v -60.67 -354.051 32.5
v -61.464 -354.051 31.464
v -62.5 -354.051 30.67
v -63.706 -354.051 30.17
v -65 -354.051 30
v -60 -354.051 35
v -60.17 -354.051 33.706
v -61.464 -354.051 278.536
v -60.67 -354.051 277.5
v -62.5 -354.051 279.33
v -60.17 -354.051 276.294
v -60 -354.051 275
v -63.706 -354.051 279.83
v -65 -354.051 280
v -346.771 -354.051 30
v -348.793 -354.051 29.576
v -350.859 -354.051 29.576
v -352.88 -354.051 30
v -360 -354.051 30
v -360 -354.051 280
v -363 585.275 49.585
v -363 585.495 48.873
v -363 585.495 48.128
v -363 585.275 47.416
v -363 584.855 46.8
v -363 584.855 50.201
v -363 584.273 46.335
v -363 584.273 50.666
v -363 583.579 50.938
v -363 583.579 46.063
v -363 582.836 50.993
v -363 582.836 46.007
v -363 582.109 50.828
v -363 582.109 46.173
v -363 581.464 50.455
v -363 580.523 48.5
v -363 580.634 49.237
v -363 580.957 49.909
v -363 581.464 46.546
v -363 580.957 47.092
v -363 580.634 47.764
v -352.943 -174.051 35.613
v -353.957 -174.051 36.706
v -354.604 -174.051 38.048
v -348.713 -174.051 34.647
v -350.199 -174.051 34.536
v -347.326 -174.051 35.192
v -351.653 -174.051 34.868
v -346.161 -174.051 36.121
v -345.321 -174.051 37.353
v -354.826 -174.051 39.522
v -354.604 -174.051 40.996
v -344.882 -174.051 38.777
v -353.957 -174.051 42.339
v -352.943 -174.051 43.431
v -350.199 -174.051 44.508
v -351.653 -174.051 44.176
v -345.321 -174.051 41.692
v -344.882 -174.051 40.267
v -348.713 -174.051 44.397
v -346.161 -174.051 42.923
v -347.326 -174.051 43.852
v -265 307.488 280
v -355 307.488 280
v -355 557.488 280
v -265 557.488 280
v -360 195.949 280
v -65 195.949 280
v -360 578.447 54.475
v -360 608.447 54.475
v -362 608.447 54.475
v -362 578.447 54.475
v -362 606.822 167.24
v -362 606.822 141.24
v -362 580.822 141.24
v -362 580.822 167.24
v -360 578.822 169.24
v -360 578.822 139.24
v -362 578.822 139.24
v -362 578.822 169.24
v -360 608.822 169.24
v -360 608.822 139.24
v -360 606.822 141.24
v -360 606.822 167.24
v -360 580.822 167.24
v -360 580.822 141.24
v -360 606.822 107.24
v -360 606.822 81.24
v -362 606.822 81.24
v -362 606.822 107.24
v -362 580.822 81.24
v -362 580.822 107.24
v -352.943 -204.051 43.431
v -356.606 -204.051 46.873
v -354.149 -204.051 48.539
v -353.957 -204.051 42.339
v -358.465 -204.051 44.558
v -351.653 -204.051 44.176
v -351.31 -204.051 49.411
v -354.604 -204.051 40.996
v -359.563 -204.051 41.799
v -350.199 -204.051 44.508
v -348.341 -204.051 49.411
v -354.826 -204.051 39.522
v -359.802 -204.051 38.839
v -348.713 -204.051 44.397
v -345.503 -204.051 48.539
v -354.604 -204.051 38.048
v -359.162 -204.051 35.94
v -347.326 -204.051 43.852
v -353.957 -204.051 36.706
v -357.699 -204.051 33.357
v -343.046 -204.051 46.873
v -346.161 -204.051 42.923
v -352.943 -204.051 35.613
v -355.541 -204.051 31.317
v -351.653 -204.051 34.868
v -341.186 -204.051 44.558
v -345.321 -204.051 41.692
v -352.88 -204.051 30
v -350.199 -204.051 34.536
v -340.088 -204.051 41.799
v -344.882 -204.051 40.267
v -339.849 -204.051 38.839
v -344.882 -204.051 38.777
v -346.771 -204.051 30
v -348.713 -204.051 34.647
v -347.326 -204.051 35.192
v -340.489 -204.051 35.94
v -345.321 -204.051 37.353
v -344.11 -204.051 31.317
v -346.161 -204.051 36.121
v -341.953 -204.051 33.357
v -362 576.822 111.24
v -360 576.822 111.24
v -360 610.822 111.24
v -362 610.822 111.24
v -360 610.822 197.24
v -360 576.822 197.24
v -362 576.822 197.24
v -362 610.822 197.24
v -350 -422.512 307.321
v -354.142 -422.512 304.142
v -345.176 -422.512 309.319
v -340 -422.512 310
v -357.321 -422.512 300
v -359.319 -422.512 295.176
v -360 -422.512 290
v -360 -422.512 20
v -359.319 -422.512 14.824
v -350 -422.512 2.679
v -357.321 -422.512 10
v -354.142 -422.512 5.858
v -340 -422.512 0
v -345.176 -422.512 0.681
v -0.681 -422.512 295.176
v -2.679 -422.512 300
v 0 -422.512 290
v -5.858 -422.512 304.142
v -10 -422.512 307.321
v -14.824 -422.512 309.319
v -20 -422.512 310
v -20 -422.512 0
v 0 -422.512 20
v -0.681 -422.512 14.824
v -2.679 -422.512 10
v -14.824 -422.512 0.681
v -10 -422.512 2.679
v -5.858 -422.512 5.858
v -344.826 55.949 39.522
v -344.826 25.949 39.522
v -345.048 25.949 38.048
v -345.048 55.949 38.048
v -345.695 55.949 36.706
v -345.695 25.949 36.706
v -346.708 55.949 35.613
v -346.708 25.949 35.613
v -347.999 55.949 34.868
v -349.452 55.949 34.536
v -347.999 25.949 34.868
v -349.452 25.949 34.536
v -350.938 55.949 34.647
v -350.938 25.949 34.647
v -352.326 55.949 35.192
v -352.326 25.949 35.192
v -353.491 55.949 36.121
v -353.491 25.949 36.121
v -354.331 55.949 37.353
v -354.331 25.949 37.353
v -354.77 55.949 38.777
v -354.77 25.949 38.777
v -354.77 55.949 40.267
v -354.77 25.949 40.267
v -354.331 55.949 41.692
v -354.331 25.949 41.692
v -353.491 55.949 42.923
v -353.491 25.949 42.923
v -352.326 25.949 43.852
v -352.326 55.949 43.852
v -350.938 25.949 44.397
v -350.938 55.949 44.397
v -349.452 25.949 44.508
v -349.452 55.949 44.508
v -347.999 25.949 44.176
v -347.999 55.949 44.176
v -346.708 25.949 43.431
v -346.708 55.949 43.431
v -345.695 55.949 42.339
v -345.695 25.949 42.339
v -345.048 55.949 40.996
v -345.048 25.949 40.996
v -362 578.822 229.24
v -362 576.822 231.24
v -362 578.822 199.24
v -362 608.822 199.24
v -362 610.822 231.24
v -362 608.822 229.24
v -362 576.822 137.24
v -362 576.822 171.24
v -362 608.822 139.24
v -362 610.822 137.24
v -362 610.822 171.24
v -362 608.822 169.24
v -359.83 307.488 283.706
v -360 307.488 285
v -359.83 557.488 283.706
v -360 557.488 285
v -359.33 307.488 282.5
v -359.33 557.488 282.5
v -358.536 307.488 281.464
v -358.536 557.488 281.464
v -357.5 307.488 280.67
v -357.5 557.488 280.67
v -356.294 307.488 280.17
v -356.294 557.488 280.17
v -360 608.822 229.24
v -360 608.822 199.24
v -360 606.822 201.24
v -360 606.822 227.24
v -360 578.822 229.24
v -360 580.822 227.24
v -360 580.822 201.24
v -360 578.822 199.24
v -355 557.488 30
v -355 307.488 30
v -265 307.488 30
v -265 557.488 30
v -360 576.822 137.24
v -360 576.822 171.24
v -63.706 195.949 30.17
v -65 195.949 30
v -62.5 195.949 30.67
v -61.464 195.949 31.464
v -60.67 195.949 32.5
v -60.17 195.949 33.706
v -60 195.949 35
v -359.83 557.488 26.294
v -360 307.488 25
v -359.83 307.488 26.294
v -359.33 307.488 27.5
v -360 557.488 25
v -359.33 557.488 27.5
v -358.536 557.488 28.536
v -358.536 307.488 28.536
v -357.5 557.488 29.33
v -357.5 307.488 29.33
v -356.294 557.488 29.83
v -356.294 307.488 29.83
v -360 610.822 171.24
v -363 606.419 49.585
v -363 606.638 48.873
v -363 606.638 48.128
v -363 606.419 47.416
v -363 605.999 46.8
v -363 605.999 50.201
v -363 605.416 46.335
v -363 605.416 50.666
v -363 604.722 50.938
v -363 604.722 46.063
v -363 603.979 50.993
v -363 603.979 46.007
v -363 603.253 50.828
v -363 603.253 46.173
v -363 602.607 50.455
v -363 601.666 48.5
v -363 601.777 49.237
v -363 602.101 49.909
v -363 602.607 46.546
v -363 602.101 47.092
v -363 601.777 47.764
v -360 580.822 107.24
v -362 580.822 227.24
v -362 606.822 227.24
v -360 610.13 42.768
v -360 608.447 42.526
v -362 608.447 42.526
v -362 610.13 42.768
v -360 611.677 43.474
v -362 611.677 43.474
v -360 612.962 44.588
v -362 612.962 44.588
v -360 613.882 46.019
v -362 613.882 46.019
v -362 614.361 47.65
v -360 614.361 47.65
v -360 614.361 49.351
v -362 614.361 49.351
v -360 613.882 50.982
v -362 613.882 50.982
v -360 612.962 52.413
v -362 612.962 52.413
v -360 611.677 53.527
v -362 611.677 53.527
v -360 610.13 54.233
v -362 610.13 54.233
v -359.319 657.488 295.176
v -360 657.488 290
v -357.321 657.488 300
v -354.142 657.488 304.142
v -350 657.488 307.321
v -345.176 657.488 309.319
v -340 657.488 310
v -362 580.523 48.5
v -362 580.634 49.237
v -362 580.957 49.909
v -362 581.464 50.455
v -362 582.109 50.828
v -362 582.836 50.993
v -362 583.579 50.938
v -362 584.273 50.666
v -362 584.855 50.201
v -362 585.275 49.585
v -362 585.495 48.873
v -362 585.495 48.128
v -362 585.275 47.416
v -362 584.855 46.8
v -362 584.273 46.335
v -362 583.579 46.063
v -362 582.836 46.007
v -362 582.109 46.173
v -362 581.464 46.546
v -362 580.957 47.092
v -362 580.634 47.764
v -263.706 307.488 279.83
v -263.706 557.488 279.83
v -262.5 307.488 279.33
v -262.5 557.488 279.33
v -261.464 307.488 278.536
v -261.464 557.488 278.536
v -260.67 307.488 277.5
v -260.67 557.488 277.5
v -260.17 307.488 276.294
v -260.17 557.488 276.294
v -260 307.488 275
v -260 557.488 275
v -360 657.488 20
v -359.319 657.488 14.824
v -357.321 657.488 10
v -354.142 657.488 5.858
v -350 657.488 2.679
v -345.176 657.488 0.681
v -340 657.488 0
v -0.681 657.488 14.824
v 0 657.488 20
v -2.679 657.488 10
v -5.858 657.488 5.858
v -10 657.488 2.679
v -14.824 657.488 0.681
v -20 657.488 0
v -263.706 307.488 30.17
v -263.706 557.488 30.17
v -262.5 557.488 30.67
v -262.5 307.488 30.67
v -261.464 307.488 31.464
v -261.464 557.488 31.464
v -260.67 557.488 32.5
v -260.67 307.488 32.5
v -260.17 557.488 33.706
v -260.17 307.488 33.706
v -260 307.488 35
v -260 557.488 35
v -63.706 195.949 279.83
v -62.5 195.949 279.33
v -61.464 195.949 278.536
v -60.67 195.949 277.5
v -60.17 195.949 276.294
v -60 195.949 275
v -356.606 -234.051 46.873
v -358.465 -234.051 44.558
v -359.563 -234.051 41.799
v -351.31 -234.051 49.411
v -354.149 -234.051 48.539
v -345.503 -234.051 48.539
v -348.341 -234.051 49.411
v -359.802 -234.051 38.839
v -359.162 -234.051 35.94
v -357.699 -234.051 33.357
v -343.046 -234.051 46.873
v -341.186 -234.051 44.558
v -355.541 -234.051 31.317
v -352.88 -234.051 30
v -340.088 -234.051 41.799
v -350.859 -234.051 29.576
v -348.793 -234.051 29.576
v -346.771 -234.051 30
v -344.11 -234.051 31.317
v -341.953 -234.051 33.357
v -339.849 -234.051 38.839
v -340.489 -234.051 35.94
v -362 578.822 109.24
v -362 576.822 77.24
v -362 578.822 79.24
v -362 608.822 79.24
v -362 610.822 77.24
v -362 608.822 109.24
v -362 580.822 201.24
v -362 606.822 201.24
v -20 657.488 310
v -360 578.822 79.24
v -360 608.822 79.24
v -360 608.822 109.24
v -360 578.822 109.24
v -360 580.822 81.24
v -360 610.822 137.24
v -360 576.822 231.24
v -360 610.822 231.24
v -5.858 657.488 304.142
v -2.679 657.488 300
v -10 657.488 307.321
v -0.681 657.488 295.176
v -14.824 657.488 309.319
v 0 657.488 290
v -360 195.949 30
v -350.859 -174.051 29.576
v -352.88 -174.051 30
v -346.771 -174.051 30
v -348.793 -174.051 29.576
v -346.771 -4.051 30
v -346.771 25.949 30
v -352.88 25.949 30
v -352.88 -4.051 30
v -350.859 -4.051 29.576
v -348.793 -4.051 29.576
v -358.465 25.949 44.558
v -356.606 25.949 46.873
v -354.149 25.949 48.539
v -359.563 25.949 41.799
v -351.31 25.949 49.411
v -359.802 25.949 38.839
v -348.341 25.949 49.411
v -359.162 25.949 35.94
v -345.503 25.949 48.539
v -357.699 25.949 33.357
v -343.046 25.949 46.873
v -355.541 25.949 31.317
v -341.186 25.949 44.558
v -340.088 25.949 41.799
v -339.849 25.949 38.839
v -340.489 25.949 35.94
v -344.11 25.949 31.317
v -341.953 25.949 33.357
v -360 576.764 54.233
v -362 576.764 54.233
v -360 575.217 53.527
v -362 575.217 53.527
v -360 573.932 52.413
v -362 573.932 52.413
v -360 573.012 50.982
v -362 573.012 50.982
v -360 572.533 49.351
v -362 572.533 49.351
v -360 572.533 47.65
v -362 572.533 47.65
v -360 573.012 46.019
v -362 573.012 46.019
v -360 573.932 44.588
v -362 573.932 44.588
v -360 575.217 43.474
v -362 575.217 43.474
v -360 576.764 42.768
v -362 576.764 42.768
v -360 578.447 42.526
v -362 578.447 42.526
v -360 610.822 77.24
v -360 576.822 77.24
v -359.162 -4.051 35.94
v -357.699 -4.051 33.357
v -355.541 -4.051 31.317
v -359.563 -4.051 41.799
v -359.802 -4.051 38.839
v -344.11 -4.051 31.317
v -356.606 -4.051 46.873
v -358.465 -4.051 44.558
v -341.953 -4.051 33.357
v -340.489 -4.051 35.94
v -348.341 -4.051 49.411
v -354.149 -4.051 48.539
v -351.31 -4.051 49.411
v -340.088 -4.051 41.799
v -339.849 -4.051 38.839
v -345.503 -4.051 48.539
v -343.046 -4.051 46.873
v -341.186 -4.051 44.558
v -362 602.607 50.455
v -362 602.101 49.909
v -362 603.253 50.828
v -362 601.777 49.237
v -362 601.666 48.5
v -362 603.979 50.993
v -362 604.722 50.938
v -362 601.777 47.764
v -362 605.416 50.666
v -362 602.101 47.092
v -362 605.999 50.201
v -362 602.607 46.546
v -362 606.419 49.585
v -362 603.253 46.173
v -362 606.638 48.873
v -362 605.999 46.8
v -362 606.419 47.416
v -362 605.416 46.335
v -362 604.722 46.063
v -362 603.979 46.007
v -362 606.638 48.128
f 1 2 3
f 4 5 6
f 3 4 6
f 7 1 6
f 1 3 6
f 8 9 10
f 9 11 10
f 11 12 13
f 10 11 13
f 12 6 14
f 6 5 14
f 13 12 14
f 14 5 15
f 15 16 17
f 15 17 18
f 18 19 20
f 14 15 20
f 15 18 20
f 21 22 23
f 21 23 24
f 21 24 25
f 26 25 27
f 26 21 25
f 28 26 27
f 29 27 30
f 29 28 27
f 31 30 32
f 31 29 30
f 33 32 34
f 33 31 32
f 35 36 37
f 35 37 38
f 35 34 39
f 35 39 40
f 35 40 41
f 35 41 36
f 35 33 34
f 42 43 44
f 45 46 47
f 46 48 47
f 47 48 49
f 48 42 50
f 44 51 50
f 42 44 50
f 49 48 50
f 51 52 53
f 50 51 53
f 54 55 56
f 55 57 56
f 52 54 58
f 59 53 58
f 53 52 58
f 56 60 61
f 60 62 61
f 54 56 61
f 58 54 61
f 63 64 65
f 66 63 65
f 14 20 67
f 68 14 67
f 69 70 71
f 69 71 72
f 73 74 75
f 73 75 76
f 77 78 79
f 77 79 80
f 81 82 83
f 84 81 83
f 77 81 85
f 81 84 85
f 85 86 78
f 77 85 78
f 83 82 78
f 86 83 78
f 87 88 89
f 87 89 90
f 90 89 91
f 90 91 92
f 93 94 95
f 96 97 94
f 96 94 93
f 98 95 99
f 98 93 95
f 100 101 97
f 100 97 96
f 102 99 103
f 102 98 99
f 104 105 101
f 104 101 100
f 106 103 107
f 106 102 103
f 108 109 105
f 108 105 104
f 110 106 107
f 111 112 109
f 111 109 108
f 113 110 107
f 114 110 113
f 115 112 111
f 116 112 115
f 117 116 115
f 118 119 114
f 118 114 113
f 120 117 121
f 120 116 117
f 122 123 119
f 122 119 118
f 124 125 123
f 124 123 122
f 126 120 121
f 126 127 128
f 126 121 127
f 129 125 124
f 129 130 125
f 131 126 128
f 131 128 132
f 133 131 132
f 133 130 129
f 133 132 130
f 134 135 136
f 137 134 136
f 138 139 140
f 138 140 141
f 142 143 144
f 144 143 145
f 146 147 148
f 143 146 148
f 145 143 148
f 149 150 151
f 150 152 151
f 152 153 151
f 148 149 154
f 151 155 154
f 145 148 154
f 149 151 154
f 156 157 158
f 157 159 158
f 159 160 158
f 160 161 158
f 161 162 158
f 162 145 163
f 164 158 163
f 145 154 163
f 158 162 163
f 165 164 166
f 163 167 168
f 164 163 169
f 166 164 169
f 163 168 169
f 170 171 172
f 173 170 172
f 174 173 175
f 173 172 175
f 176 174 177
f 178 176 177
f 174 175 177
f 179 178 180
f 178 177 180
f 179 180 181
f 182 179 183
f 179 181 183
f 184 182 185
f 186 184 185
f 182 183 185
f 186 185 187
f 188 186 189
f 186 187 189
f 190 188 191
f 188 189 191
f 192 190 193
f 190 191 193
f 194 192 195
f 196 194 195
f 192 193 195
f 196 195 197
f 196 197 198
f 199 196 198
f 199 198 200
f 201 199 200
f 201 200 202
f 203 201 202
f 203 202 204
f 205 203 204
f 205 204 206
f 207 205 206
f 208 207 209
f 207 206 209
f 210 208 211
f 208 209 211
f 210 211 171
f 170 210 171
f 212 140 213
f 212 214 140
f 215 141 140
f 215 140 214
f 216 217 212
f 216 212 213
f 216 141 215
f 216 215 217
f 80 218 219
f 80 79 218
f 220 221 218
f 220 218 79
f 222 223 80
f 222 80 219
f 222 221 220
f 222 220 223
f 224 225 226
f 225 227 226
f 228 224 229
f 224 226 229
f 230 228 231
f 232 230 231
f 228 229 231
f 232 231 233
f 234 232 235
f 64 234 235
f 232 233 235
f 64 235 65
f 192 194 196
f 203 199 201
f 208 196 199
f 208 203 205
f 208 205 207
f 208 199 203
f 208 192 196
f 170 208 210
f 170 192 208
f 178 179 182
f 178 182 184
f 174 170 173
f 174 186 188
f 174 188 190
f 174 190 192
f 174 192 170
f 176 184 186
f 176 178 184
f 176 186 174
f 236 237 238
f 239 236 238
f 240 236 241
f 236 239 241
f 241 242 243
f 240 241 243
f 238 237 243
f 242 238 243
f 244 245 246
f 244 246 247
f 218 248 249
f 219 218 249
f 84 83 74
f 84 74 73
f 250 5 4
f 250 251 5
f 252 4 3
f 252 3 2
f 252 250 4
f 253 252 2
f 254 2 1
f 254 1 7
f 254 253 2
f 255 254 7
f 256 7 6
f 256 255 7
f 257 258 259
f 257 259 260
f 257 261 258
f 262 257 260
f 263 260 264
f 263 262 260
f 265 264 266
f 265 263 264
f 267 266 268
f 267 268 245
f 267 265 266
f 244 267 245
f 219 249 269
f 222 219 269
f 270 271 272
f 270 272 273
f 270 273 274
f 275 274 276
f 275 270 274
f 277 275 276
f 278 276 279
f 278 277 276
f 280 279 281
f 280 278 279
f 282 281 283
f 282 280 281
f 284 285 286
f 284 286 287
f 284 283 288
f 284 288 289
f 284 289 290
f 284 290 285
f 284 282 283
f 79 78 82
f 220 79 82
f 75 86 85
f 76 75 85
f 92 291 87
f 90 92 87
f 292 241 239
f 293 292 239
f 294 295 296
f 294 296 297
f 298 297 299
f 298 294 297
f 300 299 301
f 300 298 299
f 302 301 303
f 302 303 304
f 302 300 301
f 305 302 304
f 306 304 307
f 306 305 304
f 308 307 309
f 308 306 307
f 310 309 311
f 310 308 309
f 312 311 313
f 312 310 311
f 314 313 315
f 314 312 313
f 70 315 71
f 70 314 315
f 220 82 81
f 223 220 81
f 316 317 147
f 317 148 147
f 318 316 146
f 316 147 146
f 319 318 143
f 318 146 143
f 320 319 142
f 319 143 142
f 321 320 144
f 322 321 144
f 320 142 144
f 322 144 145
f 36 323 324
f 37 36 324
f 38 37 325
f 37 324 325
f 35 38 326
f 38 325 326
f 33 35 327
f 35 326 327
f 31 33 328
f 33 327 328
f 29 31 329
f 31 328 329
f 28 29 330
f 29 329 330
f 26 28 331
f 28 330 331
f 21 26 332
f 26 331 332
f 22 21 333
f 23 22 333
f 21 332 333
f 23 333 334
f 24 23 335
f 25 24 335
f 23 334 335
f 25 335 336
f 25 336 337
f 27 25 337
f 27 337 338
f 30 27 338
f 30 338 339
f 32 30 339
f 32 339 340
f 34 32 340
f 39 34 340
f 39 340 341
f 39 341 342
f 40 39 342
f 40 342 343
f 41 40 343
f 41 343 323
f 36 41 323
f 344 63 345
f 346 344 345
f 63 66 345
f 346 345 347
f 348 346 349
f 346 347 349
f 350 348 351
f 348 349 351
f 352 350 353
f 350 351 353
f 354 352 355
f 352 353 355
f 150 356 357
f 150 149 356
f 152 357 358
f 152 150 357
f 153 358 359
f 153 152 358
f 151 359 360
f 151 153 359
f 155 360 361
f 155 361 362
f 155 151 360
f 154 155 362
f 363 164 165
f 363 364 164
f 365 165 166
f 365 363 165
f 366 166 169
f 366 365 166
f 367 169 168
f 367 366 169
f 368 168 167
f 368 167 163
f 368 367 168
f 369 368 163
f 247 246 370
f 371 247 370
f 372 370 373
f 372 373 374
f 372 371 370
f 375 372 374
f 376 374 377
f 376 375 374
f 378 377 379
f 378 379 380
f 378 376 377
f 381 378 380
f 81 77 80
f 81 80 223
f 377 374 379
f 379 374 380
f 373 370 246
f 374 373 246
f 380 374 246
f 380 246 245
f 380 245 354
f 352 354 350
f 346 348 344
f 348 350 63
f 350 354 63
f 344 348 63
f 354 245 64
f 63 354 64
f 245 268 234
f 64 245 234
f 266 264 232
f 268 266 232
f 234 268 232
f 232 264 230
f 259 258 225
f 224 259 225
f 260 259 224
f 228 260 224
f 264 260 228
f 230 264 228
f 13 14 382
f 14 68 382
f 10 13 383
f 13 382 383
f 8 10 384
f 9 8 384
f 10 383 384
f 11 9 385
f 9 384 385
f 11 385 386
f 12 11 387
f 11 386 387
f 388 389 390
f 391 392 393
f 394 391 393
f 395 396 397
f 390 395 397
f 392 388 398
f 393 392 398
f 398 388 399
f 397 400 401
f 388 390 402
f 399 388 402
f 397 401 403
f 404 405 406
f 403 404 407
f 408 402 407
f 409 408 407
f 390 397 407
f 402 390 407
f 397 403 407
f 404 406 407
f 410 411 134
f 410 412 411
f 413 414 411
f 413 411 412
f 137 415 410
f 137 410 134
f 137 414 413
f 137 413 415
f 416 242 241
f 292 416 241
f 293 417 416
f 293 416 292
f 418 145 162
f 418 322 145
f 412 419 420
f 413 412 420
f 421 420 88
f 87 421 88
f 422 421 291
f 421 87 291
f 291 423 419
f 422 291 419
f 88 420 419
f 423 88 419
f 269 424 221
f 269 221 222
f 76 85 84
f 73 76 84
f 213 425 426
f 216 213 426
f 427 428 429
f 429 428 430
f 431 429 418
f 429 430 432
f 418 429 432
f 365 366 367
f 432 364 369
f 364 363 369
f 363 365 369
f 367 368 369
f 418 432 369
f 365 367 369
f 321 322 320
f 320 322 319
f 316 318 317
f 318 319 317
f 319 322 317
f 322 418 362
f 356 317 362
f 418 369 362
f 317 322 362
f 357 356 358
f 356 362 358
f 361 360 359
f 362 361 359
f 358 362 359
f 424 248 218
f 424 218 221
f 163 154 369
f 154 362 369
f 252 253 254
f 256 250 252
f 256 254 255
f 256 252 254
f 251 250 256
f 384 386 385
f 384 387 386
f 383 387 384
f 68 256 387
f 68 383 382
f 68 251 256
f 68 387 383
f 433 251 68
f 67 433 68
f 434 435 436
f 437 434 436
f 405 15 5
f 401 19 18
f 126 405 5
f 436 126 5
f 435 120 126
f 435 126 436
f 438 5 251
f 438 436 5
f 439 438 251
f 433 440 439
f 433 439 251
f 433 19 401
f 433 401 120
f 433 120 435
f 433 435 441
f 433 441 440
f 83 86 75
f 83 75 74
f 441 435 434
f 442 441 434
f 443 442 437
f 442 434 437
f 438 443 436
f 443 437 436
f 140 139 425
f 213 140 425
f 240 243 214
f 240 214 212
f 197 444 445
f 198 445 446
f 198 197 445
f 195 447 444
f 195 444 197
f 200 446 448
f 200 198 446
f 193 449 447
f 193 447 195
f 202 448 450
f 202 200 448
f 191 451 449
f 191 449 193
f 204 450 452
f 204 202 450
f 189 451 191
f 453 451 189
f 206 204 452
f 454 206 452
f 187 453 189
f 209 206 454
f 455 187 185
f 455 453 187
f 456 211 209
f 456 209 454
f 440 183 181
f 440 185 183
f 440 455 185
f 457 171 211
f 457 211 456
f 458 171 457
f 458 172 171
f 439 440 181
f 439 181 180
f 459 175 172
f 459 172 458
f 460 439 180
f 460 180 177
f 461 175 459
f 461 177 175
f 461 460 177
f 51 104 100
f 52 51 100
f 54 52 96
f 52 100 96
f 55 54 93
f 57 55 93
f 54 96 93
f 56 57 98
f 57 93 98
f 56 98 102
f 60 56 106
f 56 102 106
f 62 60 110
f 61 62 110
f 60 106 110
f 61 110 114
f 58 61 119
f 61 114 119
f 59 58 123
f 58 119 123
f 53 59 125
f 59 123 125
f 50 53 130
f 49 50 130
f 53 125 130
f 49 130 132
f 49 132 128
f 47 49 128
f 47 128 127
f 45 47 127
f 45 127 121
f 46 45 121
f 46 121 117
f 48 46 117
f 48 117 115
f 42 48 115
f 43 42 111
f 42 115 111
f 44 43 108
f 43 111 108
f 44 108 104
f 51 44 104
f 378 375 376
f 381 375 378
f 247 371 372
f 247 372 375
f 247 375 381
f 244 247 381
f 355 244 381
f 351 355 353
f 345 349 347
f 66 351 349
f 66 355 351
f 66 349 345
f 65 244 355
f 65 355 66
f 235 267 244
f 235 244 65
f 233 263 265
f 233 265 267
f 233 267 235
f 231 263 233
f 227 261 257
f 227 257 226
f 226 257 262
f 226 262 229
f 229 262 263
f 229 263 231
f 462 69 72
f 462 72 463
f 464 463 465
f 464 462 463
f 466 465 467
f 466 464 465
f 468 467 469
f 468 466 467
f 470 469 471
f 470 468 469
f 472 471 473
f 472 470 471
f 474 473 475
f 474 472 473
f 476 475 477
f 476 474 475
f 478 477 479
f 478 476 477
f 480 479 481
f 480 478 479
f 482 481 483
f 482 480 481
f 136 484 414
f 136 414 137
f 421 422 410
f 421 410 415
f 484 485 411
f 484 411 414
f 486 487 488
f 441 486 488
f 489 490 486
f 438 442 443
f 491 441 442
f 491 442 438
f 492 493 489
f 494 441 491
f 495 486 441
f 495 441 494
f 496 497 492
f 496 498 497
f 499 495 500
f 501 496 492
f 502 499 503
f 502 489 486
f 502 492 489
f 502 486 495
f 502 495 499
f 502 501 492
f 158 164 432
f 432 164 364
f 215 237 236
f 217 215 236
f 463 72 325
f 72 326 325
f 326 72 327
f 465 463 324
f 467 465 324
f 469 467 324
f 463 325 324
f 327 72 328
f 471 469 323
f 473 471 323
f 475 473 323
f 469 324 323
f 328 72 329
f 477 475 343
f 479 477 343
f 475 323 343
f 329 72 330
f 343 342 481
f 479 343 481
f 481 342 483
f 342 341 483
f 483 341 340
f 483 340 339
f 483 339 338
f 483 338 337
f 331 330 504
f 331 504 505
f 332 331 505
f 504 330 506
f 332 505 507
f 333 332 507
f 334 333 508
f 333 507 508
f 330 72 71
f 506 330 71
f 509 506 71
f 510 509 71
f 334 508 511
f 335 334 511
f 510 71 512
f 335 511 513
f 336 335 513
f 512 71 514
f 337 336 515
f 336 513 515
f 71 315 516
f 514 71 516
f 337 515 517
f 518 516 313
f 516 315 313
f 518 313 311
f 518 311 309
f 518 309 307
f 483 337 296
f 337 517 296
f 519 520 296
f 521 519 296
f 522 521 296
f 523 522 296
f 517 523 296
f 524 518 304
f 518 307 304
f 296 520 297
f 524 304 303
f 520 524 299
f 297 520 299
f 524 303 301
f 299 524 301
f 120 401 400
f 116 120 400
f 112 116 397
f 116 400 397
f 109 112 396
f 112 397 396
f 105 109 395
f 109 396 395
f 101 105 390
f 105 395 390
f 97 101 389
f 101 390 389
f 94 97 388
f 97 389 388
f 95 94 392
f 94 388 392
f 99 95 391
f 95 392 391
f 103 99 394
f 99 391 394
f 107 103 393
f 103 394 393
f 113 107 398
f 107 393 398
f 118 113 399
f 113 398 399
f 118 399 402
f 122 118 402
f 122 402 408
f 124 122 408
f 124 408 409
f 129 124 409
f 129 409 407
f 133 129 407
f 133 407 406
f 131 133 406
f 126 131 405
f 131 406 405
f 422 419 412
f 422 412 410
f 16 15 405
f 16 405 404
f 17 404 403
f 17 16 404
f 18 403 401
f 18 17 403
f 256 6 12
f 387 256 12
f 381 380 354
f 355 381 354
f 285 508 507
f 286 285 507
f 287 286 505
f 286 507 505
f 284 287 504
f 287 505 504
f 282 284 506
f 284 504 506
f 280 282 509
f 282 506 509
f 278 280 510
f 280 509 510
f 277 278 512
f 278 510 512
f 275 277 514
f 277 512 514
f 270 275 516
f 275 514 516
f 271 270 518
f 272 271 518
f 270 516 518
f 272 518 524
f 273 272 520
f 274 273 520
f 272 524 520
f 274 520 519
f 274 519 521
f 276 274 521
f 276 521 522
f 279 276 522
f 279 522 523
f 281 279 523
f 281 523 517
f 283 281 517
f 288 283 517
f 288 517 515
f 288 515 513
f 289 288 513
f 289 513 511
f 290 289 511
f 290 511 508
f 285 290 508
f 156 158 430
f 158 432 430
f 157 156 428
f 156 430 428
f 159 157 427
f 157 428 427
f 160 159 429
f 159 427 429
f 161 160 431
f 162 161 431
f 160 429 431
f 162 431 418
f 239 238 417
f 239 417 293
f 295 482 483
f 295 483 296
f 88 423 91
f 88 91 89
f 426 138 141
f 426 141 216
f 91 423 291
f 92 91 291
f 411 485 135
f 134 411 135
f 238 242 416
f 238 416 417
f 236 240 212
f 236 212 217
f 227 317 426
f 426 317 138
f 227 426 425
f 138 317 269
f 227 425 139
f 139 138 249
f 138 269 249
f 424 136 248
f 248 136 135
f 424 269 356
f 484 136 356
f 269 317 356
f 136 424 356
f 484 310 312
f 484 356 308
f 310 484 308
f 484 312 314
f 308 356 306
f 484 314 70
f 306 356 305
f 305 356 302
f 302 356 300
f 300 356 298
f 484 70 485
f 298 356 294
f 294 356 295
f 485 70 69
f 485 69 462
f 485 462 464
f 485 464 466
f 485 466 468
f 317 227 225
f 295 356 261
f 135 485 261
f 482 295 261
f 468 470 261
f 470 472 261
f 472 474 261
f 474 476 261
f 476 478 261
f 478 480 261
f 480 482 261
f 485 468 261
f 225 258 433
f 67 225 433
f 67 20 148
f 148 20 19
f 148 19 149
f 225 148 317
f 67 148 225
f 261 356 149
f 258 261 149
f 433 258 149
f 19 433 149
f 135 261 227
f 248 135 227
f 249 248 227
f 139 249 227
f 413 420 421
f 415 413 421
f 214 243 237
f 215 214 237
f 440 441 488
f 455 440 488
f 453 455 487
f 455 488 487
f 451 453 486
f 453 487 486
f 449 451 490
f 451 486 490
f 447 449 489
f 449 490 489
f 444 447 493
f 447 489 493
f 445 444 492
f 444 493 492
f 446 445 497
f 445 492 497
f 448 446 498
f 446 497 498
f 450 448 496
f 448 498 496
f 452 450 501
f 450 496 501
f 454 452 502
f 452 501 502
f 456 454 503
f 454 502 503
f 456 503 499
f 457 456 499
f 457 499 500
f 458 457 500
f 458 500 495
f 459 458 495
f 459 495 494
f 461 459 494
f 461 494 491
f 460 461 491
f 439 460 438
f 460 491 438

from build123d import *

# Parameters (mm, degrees)
BOSS_EXTRUDE1_DEPTH  = 310
SKETCH2_W            = 250
SKETCH2_H            = 250
CUT_EXTRUDE3_DEPTH   = 100
SKETCH4_W            = 250
SKETCH4_H            = 550
CUT_EXTRUDE4_DEPTH   = 300
FILLET1_R            = 20
FILLET3_R            = 5
SKETCH6_W            = 34
SKETCH6_H            = 34
SKETCH6_W_2          = 30
SKETCH6_H_2          = 30
BOSS_EXTRUDE4_DEPTH  = 2
SKETCH8_W            = 26
SKETCH8_H            = 26
BOSS_EXTRUDE5_DEPTH  = 2
SKETCH9_R            = 2.5
BOSS_EXTRUDE6_DEPTH  = 2
SKETCH10_R           = 2.5
BOSS_EXTRUDE7_DEPTH  = 3
SKETCH17_R           = 10
BOSS_EXTRUDE15_DEPTH = 150
SKETCH19_R           = 10
CUT_EXTRUDE5_DEPTH   = 120
SKETCH20_R           = 5
BOSS_EXTRUDE16_DEPTH = 30
SKETCH22_R           = 10
BOSS_EXTRUDE20_DEPTH = 200
SKETCH27_R           = 10
CUT_EXTRUDE7_DEPTH   = 170
SKETCH28_R           = 5
BOSS_EXTRUDE21_DEPTH = 30


with BuildPart() as part:
    # Sketch1 → Boss-Extrude1 (new body)
    with BuildSketch(Plane.XY):
        Polygon((-360, -166.674176782), (-360, -422.512102988), (0, -422.512102988), (0, 657.487897012), (-360, 657.487897012), align=None)
    extrude(amount=BOSS_EXTRUDE1_DEPTH)

    # Sketch2 → Cut-Extrude3 (cut)
    with BuildSketch(Plane.ZY.offset(360)):
        with Locations((155, 432.487897012)):
            Rectangle(SKETCH2_W, SKETCH2_H)
    extrude(amount=-CUT_EXTRUDE3_DEPTH, mode=Mode.SUBTRACT)

    # Sketch4 → Cut-Extrude4 (cut)
    with BuildSketch(Plane.ZY.offset(360)):
        with Locations((155, -79.051121205)):
            Rectangle(SKETCH4_W, SKETCH4_H)
    extrude(amount=-CUT_EXTRUDE4_DEPTH, mode=Mode.SUBTRACT)

    # Fillet1
    fillet1_edges = [part.edges().sort_by_distance(p)[0] for p in [
        (-360, 117.487897012, 0),
        (0, 117.487897012, 0),
        (0, 117.487897012, 310),
        (-360, 117.487897012, 310),
    ]]
    fillet(fillet1_edges, radius=FILLET1_R)

    # Fillet3
    fillet3_edges = [part.edges().sort_by_distance(p)[0] for p in [
        (-60, -79.051121205, 30),
        (-60, -79.051121205, 280),
        (-360, 432.487897012, 280),
        (-260, 432.487897012, 280),
        (-360, 432.487897012, 30),
        (-260, 432.487897012, 30),
    ]]
    fillet(fillet3_edges, radius=FILLET3_R)

    # Sketch6 → Boss-Extrude4 (add)
    # profile 1 of 3: a face of its own
    with BuildSketch(Plane.ZY.offset(360)):
        with Locations((94.240330872, 593.82204287)):
            Rectangle(SKETCH6_W, SKETCH6_H)
        with Locations((94.240330872, 593.82204287)):
            Rectangle(SKETCH6_W_2, SKETCH6_H_2, mode=Mode.SUBTRACT)
    # profile 2 of 3: a face of its own
    with BuildSketch(Plane.ZY.offset(360)):
        with Locations((154.240330872, 593.82204287)):
            Rectangle(SKETCH6_W, SKETCH6_H)
        with Locations((154.240330872, 593.82204287)):
            Rectangle(SKETCH6_W_2, SKETCH6_H_2, mode=Mode.SUBTRACT)
    # profile 3 of 3: a face of its own
    with BuildSketch(Plane.ZY.offset(360)):
        with Locations((214.240330872, 593.82204287)):
            Rectangle(SKETCH6_W, SKETCH6_H)
        with Locations((214.240330872, 593.82204287)):
            Rectangle(SKETCH6_W_2, SKETCH6_H_2, mode=Mode.SUBTRACT)
    extrude(amount=BOSS_EXTRUDE4_DEPTH)

    # Sketch8 → Boss-Extrude5 (add)
    with BuildSketch(Plane.ZY.offset(360)):
        with Locations((94.240330872, 593.82204287)):
            Rectangle(SKETCH8_W, SKETCH8_H)
        with Locations((154.240330872, 593.82204287)):
            Rectangle(SKETCH8_W, SKETCH8_H)
        with Locations((214.240330872, 593.82204287)):
            Rectangle(SKETCH8_W, SKETCH8_H)
    extrude(amount=BOSS_EXTRUDE5_DEPTH)

    # Sketch9 → Boss-Extrude6 (add)
    with BuildSketch(Plane.ZY.offset(360)):
        with BuildLine():
            Line((42.525828736, 578.446941707), (42.525828736, 608.446941707))
            ThreePointArc((42.525828736, 608.446941707), (48.500463489, 614.42157646), (54.475098242, 608.446941707))
            Line((54.475098242, 608.446941707), (54.475098242, 578.446941707))
            ThreePointArc((54.475098242, 578.446941707), (48.500463489, 572.472306954), (42.525828736, 578.446941707))
        make_face()
        with Locations((48.500463489, 604.166154606)):
            Circle(SKETCH9_R, mode=Mode.SUBTRACT)
        with Locations((48.500463489, 583.02259952)):
            Circle(SKETCH9_R, mode=Mode.SUBTRACT)
    extrude(amount=BOSS_EXTRUDE6_DEPTH)

    # Sketch10 → Boss-Extrude7 (add)
    with BuildSketch(Plane.ZY.offset(360)):
        with Locations((48.500463489, 604.166154606)):
            Circle(SKETCH10_R)
        with Locations((48.500463489, 583.02259952)):
            Circle(SKETCH10_R)
    extrude(amount=BOSS_EXTRUDE7_DEPTH)

    # Sketch17 → Boss-Extrude15 (add)
    with BuildSketch(Plane(origin=(0, -354.051121205, 0), x_dir=(1, 0, 0), z_dir=(0, 1, 0))):
        with Locations((-349.825795865, -39.522123793)):
            Circle(SKETCH17_R)
    extrude(amount=BOSS_EXTRUDE15_DEPTH)

    # Sketch19 → Cut-Extrude5 (cut)
    with BuildSketch(Plane(origin=(0, -354.051121205, 0), x_dir=(1, 0, 0), z_dir=(0, 1, 0))):
        with Locations((-349.825795865, -39.522123793)):
            Circle(SKETCH19_R)
    extrude(amount=CUT_EXTRUDE5_DEPTH, mode=Mode.SUBTRACT)

    # Sketch20 → Boss-Extrude16 (add)
    with BuildSketch(Plane(origin=(0, -204.051121205, 0), x_dir=(1, 0, 0), z_dir=(0, 1, 0))):
        with Locations((-349.825795865, -39.522123793)):
            Circle(SKETCH20_R)
    extrude(amount=BOSS_EXTRUDE16_DEPTH)

    # Sketch22 → Boss-Extrude20 (add)
    with BuildSketch(Plane(origin=(0, -174.051121205, 0), x_dir=(1, 0, 0), z_dir=(0, 1, 0))):
        with Locations((-349.825795865, -39.522123793)):
            Circle(SKETCH22_R)
    extrude(amount=BOSS_EXTRUDE20_DEPTH)

    # Sketch27 → Cut-Extrude7 (cut)
    with BuildSketch(Plane.XZ.offset(174.051121205)):
        with Locations((-349.825795865, 39.522123793)):
            Circle(SKETCH27_R)
    extrude(amount=-CUT_EXTRUDE7_DEPTH, mode=Mode.SUBTRACT)

    # Sketch28 → Boss-Extrude21 (add)
    with BuildSketch(Plane(origin=(0, 25.948878795, 0), x_dir=(1, 0, 0), z_dir=(0, 1, 0))):
        with Locations((-349.825795865, -39.522123793)):
            Circle(SKETCH28_R)
    extrude(amount=BOSS_EXTRUDE21_DEPTH)


solid = part.part
